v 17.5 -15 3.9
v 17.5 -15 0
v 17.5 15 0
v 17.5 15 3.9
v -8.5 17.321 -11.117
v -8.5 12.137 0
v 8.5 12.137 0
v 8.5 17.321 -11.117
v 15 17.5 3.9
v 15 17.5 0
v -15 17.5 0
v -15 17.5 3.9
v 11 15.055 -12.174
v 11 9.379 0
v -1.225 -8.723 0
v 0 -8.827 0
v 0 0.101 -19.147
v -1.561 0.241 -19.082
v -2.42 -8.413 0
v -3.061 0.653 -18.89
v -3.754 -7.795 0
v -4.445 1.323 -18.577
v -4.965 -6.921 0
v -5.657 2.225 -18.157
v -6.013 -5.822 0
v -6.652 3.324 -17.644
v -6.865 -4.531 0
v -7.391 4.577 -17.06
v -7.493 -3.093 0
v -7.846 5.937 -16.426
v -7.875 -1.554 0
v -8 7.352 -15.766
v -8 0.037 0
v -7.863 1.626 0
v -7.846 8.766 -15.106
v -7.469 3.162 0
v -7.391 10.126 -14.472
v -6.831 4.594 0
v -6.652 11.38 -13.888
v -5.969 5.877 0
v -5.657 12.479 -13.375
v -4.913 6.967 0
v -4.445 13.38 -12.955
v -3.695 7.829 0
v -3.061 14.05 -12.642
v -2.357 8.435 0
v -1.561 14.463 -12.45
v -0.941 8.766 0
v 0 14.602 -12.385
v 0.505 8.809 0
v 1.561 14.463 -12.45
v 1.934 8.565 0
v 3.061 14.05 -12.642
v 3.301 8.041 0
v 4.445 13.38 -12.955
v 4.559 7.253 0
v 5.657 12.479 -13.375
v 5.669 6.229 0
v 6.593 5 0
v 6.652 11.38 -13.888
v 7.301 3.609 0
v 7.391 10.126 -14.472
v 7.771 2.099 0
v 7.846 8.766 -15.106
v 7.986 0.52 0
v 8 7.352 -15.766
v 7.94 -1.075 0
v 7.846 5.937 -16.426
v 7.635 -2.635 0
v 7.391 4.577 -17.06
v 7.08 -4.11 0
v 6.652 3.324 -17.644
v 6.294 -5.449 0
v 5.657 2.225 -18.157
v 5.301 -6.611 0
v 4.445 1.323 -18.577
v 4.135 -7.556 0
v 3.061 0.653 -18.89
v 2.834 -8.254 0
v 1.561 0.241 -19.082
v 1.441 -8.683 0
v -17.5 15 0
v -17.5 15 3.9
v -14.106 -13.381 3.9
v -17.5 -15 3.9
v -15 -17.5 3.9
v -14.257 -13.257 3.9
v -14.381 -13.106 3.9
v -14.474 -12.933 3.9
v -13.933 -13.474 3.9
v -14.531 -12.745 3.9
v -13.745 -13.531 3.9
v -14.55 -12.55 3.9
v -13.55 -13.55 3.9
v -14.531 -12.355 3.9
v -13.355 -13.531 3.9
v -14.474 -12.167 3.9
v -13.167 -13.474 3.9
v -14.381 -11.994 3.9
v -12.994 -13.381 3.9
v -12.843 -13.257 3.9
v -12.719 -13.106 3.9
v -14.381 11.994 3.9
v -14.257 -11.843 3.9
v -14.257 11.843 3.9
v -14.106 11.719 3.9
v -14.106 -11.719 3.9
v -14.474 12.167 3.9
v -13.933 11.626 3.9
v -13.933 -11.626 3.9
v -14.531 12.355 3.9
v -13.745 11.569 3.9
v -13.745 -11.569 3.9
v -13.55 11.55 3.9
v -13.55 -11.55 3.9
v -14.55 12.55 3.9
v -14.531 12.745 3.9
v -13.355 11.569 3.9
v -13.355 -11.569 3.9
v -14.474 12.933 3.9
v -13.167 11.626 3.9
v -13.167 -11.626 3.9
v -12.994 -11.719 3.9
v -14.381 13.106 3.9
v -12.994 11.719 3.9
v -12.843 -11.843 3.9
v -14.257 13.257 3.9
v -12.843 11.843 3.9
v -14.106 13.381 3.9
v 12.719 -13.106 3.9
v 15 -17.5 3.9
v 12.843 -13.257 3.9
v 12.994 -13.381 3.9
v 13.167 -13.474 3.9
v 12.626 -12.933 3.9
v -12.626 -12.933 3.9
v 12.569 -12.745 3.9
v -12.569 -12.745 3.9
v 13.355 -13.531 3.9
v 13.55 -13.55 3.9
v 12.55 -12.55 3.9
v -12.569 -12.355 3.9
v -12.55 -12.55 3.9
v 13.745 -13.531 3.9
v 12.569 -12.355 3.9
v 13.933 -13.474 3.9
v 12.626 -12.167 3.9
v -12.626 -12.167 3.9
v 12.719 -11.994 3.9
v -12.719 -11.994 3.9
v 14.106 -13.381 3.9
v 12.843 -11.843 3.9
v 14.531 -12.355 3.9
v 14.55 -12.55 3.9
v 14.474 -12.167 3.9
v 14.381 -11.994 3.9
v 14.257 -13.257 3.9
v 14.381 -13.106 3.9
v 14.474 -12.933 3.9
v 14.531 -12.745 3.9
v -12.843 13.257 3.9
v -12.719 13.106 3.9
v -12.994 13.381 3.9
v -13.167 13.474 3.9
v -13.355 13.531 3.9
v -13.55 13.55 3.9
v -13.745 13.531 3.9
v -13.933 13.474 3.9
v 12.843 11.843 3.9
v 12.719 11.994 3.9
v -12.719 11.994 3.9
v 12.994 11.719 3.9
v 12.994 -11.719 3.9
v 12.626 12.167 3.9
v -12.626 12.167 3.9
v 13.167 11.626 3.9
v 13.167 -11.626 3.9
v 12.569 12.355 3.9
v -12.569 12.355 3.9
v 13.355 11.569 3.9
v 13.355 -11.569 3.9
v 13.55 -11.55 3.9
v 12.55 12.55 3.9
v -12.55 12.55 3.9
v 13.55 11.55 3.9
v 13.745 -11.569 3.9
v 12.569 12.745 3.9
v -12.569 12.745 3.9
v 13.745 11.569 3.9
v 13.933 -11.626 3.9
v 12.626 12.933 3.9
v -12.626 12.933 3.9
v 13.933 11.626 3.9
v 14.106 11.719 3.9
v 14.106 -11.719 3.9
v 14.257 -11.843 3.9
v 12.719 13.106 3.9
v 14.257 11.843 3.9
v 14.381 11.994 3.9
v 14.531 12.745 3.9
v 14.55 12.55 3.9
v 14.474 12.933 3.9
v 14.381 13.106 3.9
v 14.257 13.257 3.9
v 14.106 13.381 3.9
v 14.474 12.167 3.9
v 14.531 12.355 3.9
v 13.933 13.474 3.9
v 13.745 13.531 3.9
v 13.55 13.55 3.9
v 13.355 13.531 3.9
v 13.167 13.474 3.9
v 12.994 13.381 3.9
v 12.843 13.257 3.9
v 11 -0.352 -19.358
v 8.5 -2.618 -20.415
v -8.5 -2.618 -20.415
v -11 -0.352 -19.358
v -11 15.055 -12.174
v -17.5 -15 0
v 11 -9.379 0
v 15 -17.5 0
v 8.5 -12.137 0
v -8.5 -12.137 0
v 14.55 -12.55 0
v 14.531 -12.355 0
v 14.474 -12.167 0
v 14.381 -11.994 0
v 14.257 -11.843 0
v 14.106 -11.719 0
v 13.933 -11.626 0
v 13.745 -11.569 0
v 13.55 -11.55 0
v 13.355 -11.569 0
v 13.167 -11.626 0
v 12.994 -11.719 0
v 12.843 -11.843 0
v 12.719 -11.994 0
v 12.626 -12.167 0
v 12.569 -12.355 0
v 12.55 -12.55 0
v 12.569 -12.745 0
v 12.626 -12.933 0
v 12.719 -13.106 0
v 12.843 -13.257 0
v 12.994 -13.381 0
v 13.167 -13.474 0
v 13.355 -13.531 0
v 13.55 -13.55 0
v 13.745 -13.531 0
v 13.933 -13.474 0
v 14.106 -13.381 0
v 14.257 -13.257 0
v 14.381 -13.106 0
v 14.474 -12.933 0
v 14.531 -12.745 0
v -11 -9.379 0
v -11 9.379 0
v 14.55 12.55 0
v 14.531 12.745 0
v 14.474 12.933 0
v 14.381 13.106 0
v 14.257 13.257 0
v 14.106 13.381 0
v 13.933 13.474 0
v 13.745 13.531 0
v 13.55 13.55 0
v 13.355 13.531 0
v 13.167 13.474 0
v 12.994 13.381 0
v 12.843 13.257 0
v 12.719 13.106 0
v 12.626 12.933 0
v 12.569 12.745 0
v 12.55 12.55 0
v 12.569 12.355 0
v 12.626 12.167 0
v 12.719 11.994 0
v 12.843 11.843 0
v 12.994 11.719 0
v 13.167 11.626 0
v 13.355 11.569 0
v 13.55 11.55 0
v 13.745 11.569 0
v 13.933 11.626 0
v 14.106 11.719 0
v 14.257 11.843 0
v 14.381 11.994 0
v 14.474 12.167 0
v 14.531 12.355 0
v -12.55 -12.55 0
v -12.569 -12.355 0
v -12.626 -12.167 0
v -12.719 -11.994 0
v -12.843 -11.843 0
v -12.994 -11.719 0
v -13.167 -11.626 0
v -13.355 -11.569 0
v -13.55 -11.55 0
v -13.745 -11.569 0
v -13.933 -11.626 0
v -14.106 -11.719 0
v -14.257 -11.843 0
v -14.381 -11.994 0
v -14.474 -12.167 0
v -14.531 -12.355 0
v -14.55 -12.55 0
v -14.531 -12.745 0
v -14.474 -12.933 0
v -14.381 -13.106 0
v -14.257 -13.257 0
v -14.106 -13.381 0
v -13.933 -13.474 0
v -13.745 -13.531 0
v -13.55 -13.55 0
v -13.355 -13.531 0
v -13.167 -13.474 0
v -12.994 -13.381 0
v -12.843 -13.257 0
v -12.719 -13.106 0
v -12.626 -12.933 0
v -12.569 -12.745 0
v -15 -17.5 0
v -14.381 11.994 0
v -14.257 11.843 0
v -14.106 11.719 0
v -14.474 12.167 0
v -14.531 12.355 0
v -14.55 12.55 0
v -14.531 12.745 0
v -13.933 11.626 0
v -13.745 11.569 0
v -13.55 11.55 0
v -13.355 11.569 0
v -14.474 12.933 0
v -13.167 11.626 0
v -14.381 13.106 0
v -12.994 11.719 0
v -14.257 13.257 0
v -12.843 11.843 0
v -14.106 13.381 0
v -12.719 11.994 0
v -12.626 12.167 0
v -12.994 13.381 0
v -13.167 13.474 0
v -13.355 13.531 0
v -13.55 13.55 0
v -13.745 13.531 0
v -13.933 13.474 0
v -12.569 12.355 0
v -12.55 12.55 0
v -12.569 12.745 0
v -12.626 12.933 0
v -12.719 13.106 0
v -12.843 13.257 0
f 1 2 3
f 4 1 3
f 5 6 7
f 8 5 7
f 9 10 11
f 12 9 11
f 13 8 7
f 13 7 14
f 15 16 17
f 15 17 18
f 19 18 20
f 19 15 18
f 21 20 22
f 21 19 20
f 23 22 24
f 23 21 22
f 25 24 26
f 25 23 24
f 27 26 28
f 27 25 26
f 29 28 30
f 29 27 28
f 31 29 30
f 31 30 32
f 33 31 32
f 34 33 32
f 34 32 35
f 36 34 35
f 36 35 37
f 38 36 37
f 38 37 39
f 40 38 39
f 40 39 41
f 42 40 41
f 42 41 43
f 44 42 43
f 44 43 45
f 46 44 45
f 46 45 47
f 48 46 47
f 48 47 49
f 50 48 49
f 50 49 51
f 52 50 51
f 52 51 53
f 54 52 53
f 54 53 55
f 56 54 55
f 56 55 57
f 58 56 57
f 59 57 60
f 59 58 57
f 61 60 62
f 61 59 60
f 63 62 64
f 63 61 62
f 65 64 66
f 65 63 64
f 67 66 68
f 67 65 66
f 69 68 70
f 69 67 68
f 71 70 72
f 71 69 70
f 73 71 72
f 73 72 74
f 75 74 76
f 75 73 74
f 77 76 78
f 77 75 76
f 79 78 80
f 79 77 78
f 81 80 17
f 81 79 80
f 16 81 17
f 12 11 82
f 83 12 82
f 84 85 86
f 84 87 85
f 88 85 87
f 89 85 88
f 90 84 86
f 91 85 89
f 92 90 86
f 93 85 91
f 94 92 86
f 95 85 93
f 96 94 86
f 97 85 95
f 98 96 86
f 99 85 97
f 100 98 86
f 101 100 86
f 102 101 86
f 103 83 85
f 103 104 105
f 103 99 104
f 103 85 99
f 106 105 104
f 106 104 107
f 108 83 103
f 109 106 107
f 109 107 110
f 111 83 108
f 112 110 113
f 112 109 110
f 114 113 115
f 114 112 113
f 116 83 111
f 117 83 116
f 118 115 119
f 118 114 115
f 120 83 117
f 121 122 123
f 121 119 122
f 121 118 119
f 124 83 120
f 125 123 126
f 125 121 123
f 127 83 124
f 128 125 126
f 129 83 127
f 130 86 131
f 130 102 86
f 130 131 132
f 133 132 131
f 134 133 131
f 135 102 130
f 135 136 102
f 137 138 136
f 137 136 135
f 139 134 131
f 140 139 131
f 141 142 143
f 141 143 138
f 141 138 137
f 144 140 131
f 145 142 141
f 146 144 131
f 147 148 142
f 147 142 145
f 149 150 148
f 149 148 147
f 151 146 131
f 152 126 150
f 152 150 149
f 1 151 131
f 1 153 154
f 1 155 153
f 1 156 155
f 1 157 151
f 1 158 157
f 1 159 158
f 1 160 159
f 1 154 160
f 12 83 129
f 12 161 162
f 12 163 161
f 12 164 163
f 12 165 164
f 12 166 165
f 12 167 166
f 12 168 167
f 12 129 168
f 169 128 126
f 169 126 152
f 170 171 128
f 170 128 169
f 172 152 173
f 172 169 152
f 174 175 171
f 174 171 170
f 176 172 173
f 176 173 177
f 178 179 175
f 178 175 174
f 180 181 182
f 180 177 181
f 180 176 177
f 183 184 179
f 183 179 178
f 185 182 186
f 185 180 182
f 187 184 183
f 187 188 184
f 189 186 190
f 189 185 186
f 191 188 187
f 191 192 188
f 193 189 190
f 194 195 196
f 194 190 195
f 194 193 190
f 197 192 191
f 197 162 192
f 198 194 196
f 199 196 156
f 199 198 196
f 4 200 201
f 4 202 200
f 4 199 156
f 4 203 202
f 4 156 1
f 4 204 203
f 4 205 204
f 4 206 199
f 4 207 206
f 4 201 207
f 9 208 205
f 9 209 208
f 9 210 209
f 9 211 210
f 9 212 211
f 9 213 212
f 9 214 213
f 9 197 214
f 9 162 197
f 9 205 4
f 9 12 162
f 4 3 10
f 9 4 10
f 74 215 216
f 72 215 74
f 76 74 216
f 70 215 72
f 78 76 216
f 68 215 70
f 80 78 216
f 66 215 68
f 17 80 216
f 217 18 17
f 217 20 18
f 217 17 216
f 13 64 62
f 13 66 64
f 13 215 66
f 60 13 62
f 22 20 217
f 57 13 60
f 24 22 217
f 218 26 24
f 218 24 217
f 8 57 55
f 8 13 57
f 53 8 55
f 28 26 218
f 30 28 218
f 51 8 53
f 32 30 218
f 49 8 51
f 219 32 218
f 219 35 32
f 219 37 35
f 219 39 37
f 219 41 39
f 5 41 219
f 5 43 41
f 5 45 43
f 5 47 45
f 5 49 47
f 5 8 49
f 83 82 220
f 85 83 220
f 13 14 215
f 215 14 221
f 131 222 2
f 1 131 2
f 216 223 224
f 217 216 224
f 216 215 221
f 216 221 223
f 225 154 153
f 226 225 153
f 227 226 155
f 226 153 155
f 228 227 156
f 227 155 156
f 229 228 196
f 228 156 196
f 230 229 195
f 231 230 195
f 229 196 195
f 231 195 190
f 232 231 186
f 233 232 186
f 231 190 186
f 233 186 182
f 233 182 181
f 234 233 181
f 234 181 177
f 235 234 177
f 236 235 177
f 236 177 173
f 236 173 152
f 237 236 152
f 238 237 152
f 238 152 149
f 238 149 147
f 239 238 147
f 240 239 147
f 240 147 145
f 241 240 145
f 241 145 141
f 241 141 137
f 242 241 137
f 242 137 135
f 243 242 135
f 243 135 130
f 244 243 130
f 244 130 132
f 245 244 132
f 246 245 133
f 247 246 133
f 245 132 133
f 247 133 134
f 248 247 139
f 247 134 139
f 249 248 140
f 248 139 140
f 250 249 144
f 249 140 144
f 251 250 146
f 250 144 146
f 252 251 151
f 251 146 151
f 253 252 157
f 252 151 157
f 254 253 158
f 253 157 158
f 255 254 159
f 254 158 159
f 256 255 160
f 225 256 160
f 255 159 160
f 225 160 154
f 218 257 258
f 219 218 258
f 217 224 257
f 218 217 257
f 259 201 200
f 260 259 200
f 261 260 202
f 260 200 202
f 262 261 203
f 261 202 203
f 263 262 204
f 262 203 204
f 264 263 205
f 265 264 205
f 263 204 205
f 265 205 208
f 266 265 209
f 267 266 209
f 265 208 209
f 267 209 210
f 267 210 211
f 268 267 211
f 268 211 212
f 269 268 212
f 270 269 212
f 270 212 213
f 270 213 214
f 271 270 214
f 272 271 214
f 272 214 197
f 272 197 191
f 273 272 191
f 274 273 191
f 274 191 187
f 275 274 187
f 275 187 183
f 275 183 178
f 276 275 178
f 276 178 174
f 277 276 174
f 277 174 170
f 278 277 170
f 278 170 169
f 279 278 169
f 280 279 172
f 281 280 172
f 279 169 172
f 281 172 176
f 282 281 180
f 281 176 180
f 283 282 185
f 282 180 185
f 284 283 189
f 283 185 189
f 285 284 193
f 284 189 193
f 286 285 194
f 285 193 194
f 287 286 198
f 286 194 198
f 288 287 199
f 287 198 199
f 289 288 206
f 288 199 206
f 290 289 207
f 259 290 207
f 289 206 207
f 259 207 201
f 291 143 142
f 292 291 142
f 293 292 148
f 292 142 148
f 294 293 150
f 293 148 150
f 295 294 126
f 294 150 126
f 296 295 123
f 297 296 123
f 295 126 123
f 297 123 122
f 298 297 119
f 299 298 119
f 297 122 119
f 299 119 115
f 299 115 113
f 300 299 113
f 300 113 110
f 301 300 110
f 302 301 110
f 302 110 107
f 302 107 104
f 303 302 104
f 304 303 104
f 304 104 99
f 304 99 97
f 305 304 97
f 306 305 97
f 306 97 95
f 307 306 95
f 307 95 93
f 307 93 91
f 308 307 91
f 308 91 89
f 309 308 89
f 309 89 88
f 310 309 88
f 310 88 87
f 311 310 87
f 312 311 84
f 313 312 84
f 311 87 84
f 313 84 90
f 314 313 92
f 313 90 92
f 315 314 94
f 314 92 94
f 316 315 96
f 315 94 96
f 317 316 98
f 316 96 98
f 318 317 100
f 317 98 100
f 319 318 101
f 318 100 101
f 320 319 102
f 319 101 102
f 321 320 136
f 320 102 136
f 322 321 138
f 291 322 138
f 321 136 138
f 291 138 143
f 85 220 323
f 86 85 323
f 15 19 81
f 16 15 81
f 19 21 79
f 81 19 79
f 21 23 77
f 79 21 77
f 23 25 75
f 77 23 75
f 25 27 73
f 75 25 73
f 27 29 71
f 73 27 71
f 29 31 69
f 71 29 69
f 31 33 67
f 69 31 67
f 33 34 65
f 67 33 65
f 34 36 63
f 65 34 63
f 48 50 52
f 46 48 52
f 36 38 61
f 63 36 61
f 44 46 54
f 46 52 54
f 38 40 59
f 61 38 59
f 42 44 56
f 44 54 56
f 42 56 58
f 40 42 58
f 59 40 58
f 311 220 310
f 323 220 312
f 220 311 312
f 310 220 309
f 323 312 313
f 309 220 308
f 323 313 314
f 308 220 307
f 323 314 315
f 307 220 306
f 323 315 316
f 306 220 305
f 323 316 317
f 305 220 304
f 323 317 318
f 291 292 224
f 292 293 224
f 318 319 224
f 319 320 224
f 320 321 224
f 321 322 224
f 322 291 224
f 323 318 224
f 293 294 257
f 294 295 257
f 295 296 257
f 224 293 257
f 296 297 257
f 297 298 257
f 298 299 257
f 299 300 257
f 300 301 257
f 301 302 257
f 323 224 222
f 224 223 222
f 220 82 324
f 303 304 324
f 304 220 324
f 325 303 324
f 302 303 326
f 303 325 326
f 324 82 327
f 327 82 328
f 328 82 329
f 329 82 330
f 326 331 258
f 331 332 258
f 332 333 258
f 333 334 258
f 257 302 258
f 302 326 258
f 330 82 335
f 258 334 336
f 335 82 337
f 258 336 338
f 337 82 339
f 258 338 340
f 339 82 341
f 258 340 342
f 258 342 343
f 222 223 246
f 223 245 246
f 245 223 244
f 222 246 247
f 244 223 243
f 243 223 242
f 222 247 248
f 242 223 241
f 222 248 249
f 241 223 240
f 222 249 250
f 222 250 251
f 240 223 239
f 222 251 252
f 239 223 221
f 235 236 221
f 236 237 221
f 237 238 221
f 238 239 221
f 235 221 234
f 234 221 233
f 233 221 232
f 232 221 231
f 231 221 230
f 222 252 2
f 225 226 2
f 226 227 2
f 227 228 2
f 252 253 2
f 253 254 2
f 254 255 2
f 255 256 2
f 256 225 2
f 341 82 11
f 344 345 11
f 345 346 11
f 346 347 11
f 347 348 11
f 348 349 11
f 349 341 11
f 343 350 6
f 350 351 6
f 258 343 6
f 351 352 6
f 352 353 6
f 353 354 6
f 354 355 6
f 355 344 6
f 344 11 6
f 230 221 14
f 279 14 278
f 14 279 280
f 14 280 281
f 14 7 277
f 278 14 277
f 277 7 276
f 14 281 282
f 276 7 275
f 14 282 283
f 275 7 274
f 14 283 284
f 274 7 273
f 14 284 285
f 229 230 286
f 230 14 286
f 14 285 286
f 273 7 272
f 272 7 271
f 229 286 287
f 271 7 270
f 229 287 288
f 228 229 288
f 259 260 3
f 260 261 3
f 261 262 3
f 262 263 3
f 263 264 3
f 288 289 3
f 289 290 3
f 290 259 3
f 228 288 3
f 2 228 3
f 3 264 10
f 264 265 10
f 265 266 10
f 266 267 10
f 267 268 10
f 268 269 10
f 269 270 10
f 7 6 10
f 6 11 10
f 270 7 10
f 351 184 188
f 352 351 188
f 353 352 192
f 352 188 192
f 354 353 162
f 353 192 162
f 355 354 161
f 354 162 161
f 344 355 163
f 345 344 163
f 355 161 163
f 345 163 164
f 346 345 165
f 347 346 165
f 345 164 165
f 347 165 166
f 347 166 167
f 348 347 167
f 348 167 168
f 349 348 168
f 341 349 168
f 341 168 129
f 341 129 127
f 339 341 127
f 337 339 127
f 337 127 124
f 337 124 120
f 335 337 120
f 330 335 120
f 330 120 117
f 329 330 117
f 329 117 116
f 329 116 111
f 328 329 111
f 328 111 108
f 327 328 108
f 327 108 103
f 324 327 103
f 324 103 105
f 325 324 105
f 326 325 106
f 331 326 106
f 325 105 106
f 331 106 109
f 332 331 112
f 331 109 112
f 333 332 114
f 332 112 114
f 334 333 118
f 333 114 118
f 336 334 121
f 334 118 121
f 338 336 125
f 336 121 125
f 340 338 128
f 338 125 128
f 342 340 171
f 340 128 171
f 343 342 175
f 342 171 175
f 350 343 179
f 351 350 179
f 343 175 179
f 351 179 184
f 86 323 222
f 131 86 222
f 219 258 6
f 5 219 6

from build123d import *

# Parameters (mm, degrees)
BOSS_EXTRUDE1_DEPTH       = 3.9
SKETCH2_R                 = 1
CUT_EXTRUDE3_DEPTH        = 29.385031266
BOSS_EXTRUDE11_DEPTH      = 10
BOSS_EXTRUDE11_DEPTH_BACK = 15
SKETCH161_R               = 8
CUT_EXTRUDE5_DEPTH        = 10


with BuildPart() as part:
    # Sketch1 → Boss-Extrude1 (new body)
    with BuildSketch(Plane.XY):
        Polygon((17.5, 15), (15, 17.5), (-15, 17.5), (-17.5, 15), (-17.5, -15), (-15, -17.5), (15, -17.5), (17.5, -15), align=None)
    extrude(amount=BOSS_EXTRUDE1_DEPTH)

    # Sketch2 → Cut-Extrude3 (cut, through all)
    with BuildSketch(Plane.XY.offset(13.9)):
        with Locations((-13.55, 12.55)):
            Circle(SKETCH2_R)
        with Locations((-13.55, -12.55)):
            Circle(SKETCH2_R)
        with Locations((13.55, 12.55)):
            Circle(SKETCH2_R)
        with Locations((13.55, -12.55)):
            Circle(SKETCH2_R)
    extrude(amount=-CUT_EXTRUDE3_DEPTH, mode=Mode.SUBTRACT)

    # Sketch161 → Boss-Extrude11 (add, two sides: drawn at the far end of the back side and taken through both)
    with BuildSketch(Plane(origin=(0, 3.125608415, -6.702888877), x_dir=(-1, 0, 0), z_dir=(0, 0.42261826174068795, -0.9063077870366554)).offset(-BOSS_EXTRUDE11_DEPTH_BACK)):
        Polygon((-8.5, 11), (-11, 8.5), (-11, -8.5), (-8.5, -11), (8.5, -11), (11, -8.5), (11, 8.5), (8.5, 11), align=None)
        with Locations(Location((0, 0, 0), (0, 0, 270))):
            Circle(SKETCH161_R, mode=Mode.SUBTRACT)
    extrude(amount=BOSS_EXTRUDE11_DEPTH + BOSS_EXTRUDE11_DEPTH_BACK)

    # Sketch162 → Cut-Extrude5 (cut)
    with BuildSketch(Plane.XY.offset(13.9)):
        Polygon((-17.5, 15), (-15, 17.5), (15, 17.5), (17.5, 15), (17.5, -15), (15, -17.5), (-15, -17.5), (-17.5, -15), align=None)
    extrude(amount=-CUT_EXTRUDE5_DEPTH, mode=Mode.SUBTRACT)


solid = part.part
